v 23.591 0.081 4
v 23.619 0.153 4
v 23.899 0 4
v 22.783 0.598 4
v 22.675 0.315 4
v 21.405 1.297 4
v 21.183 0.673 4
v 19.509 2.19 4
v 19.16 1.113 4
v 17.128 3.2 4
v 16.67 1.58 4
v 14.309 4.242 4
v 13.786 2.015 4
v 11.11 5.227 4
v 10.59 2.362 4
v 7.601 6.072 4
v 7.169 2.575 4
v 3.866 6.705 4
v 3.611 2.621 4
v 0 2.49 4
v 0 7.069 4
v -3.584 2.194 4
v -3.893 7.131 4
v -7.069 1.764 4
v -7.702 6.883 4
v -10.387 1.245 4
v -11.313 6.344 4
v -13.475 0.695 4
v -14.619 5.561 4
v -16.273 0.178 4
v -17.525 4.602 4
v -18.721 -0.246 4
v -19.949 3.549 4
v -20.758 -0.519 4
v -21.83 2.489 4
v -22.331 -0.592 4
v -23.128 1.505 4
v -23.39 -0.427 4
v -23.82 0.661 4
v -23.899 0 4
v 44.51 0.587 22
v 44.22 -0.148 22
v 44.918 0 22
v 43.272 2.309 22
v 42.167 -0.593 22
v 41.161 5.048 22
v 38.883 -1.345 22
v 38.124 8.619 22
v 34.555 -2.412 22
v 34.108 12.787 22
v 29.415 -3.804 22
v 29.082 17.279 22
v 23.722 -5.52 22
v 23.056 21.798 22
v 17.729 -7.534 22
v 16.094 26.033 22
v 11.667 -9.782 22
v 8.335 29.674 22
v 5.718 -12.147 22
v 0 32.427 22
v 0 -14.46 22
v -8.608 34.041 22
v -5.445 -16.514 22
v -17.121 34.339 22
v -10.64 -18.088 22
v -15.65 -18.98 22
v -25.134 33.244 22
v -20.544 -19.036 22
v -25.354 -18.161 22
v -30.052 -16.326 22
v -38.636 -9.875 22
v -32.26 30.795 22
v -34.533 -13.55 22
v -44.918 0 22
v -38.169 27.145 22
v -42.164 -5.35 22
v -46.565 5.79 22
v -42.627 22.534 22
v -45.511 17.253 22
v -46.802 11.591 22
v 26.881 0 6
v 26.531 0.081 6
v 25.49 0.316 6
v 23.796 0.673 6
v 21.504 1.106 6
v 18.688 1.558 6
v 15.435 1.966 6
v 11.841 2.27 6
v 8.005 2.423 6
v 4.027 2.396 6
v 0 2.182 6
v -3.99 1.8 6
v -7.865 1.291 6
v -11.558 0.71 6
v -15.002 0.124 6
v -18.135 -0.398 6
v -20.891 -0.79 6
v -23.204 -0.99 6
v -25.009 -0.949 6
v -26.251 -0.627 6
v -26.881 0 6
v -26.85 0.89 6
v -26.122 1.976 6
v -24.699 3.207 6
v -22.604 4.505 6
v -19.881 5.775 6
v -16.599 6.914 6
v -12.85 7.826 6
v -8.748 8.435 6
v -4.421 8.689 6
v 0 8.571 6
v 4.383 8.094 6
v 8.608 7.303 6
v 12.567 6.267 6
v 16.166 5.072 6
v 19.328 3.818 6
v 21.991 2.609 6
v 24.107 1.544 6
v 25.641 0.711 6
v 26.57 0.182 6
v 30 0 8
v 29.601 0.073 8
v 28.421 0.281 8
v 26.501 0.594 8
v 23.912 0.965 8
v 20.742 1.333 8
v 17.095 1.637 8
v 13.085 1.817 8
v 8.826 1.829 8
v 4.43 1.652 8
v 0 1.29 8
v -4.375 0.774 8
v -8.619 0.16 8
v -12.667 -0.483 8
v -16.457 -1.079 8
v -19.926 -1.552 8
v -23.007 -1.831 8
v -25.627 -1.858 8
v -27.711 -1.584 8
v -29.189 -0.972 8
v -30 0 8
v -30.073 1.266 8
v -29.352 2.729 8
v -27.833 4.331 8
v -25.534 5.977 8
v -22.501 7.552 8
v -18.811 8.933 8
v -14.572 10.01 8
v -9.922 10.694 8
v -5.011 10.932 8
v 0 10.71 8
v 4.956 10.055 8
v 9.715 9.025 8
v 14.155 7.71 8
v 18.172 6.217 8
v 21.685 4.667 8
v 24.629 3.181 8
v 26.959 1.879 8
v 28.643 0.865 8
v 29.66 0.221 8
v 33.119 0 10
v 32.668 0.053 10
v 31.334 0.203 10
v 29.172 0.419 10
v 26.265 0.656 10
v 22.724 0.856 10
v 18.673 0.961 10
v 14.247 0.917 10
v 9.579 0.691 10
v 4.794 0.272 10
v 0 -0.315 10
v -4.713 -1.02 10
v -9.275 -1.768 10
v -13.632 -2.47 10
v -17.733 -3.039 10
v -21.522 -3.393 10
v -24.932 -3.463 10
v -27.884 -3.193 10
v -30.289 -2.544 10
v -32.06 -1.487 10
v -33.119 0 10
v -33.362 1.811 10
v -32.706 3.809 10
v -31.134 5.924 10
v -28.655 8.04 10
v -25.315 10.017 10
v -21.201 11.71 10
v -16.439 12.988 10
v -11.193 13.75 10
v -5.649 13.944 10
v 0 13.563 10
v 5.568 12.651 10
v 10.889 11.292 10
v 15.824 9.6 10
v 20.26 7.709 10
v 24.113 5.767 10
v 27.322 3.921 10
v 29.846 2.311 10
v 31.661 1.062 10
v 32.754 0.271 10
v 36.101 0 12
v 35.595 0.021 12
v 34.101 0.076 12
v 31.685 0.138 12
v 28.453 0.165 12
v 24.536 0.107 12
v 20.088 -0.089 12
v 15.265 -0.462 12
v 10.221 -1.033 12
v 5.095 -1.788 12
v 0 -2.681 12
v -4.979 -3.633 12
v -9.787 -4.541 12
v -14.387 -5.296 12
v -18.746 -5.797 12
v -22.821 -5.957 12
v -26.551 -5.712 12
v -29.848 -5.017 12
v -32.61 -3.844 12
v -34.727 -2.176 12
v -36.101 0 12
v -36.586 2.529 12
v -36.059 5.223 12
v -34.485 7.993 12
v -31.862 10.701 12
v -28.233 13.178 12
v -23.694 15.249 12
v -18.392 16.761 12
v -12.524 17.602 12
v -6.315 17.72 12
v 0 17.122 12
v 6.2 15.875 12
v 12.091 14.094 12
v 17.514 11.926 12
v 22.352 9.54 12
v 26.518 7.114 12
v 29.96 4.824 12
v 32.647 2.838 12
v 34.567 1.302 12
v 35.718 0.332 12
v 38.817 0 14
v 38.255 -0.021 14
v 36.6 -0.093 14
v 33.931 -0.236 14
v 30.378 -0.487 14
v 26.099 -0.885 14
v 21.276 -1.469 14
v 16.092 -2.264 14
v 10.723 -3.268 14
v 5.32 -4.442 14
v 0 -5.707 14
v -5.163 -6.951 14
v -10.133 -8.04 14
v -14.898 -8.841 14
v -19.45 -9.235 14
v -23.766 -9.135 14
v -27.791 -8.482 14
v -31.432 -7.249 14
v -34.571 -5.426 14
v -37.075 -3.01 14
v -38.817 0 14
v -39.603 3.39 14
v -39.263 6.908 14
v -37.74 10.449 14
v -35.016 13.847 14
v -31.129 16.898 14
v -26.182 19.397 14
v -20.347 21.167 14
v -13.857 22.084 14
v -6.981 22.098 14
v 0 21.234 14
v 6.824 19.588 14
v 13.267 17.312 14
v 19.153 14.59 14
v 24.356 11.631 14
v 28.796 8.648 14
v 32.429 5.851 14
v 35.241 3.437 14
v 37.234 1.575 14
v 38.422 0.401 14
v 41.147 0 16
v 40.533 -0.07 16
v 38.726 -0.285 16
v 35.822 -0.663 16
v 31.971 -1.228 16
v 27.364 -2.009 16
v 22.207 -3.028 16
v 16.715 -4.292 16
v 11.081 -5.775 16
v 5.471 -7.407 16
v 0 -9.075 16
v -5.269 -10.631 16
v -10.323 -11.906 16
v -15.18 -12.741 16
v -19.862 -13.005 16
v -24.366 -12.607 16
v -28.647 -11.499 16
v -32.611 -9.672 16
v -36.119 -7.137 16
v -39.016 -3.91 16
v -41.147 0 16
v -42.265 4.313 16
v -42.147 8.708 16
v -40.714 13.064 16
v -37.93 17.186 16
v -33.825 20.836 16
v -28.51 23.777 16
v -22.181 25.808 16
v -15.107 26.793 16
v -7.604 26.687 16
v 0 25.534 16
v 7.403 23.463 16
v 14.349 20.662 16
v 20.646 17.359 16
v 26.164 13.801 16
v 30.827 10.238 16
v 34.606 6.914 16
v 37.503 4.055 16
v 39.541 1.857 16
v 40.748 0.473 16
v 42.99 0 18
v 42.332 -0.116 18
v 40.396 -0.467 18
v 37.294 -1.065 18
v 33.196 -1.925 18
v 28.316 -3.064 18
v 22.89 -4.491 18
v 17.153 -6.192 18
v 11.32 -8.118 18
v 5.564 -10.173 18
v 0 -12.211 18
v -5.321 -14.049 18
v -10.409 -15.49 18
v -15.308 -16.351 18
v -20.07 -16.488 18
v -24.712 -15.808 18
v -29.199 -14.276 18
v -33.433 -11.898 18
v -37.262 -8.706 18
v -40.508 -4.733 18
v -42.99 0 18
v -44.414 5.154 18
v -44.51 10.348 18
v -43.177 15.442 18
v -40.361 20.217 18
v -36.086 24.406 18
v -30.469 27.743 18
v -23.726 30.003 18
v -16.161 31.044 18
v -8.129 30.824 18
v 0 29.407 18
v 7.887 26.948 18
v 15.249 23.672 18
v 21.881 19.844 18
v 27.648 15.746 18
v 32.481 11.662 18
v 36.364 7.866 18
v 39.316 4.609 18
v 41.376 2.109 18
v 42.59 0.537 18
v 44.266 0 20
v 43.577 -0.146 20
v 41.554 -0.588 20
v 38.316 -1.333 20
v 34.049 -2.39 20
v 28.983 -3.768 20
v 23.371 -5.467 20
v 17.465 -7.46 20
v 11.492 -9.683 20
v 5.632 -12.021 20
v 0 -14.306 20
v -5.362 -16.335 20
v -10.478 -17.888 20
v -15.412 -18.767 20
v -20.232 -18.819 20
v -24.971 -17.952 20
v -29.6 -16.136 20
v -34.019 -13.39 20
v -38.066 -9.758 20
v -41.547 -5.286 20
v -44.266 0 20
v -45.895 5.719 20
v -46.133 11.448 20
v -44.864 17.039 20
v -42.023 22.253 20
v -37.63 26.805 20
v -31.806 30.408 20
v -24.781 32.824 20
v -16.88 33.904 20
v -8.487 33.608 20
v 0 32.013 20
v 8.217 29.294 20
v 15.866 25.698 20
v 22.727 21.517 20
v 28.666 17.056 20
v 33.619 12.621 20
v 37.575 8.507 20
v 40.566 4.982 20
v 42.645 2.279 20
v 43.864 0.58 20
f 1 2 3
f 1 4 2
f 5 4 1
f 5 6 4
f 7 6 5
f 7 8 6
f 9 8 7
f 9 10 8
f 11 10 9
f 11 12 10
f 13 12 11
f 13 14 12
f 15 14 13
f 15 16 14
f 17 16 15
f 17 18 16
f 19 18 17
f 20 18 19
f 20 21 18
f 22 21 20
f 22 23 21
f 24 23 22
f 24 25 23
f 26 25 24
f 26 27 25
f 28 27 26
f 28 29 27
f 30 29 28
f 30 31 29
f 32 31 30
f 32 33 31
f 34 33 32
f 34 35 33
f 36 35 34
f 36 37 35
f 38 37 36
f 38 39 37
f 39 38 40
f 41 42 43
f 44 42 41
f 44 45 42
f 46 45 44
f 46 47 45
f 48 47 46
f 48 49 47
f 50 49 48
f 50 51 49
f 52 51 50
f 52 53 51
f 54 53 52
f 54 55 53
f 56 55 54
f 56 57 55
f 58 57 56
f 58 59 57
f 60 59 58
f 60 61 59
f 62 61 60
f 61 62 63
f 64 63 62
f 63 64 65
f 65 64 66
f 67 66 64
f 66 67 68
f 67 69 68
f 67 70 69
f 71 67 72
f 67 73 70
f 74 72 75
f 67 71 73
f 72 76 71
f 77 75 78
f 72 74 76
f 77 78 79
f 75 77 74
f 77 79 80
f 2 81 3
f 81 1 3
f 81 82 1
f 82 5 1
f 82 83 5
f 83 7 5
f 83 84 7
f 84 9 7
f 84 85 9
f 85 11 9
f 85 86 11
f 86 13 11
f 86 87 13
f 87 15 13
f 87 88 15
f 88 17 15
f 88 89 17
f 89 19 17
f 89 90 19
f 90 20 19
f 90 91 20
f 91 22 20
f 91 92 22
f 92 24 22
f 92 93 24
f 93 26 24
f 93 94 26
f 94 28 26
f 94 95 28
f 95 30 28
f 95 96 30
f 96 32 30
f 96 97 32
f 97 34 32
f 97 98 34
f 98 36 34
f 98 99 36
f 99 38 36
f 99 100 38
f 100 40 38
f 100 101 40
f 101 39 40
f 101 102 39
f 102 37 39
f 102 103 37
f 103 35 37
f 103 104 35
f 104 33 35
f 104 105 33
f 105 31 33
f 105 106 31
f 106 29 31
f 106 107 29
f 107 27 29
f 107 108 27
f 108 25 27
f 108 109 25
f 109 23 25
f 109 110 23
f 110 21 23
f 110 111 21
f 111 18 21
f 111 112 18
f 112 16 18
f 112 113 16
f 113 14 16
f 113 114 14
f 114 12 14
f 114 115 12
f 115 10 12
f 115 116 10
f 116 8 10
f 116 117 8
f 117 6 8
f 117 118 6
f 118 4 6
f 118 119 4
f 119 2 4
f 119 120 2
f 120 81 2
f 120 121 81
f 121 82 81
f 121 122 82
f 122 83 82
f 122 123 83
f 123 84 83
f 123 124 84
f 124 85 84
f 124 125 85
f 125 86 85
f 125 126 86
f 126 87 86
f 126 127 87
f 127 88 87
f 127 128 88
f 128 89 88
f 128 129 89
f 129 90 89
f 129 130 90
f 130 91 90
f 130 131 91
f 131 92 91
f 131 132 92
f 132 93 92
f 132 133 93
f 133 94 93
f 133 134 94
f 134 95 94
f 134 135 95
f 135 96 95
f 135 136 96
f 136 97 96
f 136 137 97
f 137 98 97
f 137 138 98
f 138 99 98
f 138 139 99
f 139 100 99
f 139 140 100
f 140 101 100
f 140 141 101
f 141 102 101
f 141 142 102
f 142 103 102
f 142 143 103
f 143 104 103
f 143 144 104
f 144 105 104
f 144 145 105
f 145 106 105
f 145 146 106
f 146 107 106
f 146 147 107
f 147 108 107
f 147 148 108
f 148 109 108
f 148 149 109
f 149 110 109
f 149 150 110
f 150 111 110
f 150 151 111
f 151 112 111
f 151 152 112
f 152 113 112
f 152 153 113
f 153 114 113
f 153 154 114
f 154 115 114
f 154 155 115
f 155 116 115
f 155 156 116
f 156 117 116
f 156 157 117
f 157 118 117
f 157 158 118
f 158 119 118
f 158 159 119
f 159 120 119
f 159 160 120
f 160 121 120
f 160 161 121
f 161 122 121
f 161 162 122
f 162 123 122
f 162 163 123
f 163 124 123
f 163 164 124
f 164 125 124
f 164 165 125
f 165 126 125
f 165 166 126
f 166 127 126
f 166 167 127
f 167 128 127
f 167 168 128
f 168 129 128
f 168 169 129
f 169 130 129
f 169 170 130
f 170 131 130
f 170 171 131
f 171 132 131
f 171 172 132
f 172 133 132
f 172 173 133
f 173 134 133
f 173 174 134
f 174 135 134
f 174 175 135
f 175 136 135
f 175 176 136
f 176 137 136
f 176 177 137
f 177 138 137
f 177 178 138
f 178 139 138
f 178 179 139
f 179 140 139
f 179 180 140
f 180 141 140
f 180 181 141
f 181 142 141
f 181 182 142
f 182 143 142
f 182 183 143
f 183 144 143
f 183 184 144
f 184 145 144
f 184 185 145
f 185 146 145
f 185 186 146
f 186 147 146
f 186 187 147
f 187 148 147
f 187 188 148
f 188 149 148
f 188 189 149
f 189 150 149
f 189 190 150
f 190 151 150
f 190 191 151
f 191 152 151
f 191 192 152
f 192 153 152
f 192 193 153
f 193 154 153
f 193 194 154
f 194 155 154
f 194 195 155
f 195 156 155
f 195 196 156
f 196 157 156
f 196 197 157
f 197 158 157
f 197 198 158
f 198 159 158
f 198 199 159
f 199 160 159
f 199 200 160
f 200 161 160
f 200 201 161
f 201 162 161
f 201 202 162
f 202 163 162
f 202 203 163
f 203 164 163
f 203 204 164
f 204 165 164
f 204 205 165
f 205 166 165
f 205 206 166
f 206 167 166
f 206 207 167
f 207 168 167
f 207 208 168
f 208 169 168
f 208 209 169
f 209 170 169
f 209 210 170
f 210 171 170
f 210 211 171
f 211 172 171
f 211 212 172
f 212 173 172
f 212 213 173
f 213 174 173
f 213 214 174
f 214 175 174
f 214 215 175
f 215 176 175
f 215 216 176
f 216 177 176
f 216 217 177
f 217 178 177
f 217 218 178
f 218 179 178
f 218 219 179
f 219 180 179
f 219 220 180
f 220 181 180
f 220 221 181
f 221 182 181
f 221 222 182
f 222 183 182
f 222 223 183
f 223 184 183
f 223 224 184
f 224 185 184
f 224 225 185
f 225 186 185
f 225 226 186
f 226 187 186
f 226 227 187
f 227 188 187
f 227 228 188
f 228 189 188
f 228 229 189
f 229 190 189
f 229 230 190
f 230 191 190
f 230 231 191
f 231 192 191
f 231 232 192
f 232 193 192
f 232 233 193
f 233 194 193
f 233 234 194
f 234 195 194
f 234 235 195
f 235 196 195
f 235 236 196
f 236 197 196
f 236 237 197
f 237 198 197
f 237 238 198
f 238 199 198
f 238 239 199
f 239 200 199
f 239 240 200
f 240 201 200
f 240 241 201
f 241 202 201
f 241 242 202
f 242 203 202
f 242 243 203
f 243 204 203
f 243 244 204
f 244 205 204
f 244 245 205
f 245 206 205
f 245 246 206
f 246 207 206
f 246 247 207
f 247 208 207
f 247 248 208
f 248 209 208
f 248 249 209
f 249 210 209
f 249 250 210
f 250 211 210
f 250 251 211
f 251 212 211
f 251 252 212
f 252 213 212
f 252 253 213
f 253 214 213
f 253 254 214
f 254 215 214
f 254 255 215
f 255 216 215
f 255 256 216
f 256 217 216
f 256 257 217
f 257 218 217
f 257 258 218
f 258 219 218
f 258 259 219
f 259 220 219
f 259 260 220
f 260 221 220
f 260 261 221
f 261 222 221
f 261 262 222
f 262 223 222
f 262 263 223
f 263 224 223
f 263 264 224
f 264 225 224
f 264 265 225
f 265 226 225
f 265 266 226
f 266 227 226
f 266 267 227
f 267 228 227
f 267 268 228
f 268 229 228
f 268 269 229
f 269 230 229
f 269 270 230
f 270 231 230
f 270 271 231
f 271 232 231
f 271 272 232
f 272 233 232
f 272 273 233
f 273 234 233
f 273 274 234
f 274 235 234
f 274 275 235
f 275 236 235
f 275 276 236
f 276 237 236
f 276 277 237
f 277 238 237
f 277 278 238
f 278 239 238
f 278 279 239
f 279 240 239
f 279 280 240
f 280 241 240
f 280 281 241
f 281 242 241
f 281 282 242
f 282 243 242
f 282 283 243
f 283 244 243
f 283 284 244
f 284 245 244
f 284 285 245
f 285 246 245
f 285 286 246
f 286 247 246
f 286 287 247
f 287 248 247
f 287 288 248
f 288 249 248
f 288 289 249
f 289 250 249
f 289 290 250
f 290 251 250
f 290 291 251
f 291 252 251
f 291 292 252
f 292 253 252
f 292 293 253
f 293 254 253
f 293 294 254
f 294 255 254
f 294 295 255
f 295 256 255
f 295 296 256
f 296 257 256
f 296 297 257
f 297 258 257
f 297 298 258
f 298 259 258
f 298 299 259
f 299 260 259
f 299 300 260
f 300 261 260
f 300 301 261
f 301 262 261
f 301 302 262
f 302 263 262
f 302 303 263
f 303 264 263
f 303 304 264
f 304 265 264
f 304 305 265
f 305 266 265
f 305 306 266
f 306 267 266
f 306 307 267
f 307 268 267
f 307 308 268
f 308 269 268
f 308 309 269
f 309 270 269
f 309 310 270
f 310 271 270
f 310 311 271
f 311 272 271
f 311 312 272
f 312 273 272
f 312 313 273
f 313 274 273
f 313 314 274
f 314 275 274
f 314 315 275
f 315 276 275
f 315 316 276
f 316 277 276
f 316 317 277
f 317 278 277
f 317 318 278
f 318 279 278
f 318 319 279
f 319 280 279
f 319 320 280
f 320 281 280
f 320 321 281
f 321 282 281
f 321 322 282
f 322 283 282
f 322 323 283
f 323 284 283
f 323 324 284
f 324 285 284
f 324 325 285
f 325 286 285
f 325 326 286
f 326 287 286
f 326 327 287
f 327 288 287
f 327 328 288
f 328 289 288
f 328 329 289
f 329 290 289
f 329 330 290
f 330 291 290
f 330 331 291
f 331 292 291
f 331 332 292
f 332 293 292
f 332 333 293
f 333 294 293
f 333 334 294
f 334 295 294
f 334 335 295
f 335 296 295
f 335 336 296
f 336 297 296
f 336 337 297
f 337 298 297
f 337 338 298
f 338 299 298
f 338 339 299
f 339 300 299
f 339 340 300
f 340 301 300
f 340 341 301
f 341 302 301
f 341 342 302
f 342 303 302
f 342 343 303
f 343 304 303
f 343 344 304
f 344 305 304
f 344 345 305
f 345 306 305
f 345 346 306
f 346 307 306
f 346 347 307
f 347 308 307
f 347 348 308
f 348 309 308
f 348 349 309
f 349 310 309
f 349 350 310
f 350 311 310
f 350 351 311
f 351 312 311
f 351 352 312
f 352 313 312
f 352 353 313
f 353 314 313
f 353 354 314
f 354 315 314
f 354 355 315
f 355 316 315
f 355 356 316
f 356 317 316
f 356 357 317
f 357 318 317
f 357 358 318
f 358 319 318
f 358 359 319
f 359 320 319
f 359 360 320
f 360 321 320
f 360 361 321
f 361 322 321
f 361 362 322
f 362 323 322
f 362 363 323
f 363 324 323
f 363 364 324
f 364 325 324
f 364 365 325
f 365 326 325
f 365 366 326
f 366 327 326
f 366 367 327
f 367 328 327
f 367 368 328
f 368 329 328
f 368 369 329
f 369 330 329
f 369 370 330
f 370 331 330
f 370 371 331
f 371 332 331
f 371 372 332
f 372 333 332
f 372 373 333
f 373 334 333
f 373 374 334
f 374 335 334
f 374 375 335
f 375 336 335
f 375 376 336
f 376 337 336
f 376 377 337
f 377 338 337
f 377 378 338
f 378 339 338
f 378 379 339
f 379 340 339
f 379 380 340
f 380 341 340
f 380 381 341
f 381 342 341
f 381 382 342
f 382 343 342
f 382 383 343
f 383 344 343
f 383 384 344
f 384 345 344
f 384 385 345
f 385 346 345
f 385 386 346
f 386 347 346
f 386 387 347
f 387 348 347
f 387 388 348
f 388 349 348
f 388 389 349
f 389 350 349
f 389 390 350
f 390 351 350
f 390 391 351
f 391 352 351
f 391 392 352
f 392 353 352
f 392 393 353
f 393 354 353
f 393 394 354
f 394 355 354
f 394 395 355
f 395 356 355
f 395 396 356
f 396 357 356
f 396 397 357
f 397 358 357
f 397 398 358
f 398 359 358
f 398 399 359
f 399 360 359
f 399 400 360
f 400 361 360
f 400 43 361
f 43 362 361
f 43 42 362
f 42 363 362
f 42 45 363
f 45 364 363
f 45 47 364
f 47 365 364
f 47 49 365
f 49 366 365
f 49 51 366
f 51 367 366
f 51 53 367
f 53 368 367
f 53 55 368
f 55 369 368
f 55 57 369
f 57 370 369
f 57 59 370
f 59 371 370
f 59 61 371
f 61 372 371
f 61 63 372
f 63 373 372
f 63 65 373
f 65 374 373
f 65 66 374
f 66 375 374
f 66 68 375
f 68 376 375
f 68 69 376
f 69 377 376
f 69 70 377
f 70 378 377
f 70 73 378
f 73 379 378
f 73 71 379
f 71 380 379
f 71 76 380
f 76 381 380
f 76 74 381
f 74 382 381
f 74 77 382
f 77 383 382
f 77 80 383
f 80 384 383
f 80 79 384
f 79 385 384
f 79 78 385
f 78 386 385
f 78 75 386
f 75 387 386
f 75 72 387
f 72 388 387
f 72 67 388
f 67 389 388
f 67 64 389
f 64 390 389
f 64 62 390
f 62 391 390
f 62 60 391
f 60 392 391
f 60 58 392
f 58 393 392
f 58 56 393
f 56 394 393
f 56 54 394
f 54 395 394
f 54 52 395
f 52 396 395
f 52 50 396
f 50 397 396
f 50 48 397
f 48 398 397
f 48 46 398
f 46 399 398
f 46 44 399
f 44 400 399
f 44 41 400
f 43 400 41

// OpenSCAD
// file: naca4.scad
// Naca4.scad - library for parametric airfoils of 4 digit NACA series
// Code: Rudolf Huttary, Berlin
// June 2015
// commercial use prohibited


// general use: for more examples refer to sampler.scad
// naca = naca digits or 3el vector  (default = 12 or [0, 0, .12])
// L    = chord length [mm]      (default= 100)
// N    = # sample points        (default= 81)
// h    = height [mm]            (default= 1)
// open = close at the thin end? (default = true)
// two equivalent example calls
 airfoil(naca = 2408, L = 60, N=1001, h = 30, open = false);
// airfoil(naca = [.2, .4, .32], L = 60, N=1001, h = 30, open = false);

module help()
{
  echo(str("\n\nList of signatures in lib:\n=================\n",
  "module airfoil(naca=2412, L = 100, N = 81, h = 1, open = false) - renders airfoil object\n",
  "module airfoil(naca=[.2, .4, .12], L = 100, N = 81, h = 1, open = false) - renders airfoil object using percentage for camber,  camber distance and thicknes\n",
  "function airfoil_data(naca=12, L = 100, N = 81, open = false)\n",
  "=================\n"));
}

help();
// this is the object
module airfoil(naca=12, L = 100, N = 81, h = 1, open = false)
{
  linear_extrude(height = h)
  polygon(points = airfoil_data(naca, L, N, open));
}

// this is the main function providing the airfoil data
function airfoil_data(naca=12, L = 100, N = 81, open = false) =
  let(Na = len(naca)!=3?NACA(naca):naca)
  let(A = [.2969, -0.126, -.3516, .2843, open?-0.1015:-0.1036])
  [for (b=[-180:360/(N):179.99])
    let (x = (1-cos(b))/2)
    let(yt = sign(b)*Na[2]/.2*(A*[sqrt(x), x, x*x, x*x*x, x*x*x*x]))
    Na[0]==0?L*[x, yt]:L*camber(x, yt, Na[0], Na[1], sign(b))];

// helper functions
function NACA(naca) =
  let (M = floor(naca/1000))
  let (P = floor((naca-M*1000)/100))
  [M/100, P/10, floor(naca-M*1000-P*100)/100];

function camber(x, y, M, P, upper) =
  let(yc = (x<P)?M/P/P*(2*P*x-x*x): M/(1-P)/(1-P)*(1 - 2*P + 2*P*x -x*x))
  let(dy = (x<P)?2*M/P/P*(P-x):2*M/(1-P)/(1-P)*(P-x))
  let(th = atan(dy))
  [upper ? x - y*sin(th):x + y*sin(th), upper ? yc + y*cos(th):yc - y*cos(th)];
// main file
// Naca4_sweep.scad - sweep library
// Code: Rudolf Huttary, Berlin
// June 2015
// commercial use prohibited

use <naca4.scad>

//example1();
//rotate([80, 180, 130])
example();

// sweep from NACA1480 to NACA6480 (len = 230 mm, winding y,z = 80°
// sweeps generates a single polyhedron from multiple datasets
module example()
{
  N = 40;
  sweep(gen_dat(N=5, dz=1,N=N));

  // specific generator function
  function gen_dat(M=10,dz=.1,N=10) = [for (i=[1:dz:M])
    let( L = length(i))
    let( af = vec3D(
        airfoil_data([.1,.5,thickness(i)], L=length(i), N = N)))
    T_(-L/2, 0, (i+1)*2, af)];  // translate airfoil

  function thickness(i) = .5*sin(i*i)+.1;
  function length(i) = (60+sin(12*(i-3))*30);
}

module help()
{
  echo(str("\n\nList of signatures in lib:\n=================\n",
  "sweep(dat, convexity = 5, showslices = false, plaincaps = true)  // dat - vec of vec2, with vec1 = airfoil_data\n",
  "function vec3D(v, z=0)  // expand vec2 to vec3",
  "function rot(w=0, p) // rotate vec2",
  "function T_(x=0, y=0, z=0, v) // translates vec of vec3\n",
  "function R_(x=0, y=0, z=0, v) // rotates vec of vec3\n",
  "function Rx_(x=0, v) // x-rotates vec of vec3\n",
  "function Ry_(y=0, v) // y-rotates vec of vec3\n",
  "function Rz_(z=0, v) // z-rotates vec of vec3\n",
  "function T_(x=0, y=0, z=0, v) // translates vec of vec3\n",
  "function Tx_(x=0, v) // x-translates vec of vec3\n",
  "function Ry_(y=0, v) // y-translates vec of vec3\n",
  "function Rz_(z=0, v) // z-translates vec of vec3\n",
  "function S_(x=0, y=0, z=0, v) // scales vec of vec3\n",
  "function Sx_(x=0, v) // x-translates vec of vec3\n",
  "function Sy_(x=0, v) // y-translates vec of vec3\n",
  "function Sz_(x=0, v) // z-translates vec of vec3\n",
  "=================\n"));
}


// generate polyhedron from multiple airfoil_datasets
// dat - vec of vec1, with vec1 = simple polygon like airfoil_data, > 3 points per dataset expected
module sweep(dat, convexity = 5, showslices = false, plaincaps = true)
{
  n = len(dat);     // # datasets
  l = len(dat[0]);  // points per dataset
  if(l<=3)
    echo("ERROR: sweep() expects more than 3 points per dataset");
  else
  {
    if(n==1)
      polyhedron(points = dat[0], faces = [count(l-1, 0)]);
    else{
    first = plaincaps?[count(l-1, 0)]:
            faces_polygon(l, true);  // triangulate first dataset
    last = plaincaps?[count((n-1)*l,(n)*l-1)]:
            faces_shift((n-2)*l, faces_polygon(l, false)); // triangulate last dataset
    if (showslices)
      for(i=[0:n-1])
        sweep([dat[i]]);
    else
      if (n<2)  // this case is also used recursively for showslices
        polyhedron(points = flat(), faces  = last, convexity = 5);
      else
      {
        polyhedron(points = flat(),
                   faces  = concat(first, last, faces_sweep(l,n)), convexity = 5);
      }
    }
  }
  function count(a, b) = let(st = (a<b?1:-1))[for (i=[a:st:b]) i];
  function faces_shift(d, dat) = [for (i=[0:len(dat)-1]) dat[i] + [d, d, d]];
  function flat() = [for (i=[0:n-1], j=[0:l-1]) dat[i][j]];
}

function del(A, n) = [for(i=[0:len(A)-1]) if (n!=i)A[i]];

//// composition stuff for polyhedron
  function faces_sweep(l, n=1) = let(M = n*l)
      concat([[0,l,l-1]],   // first face
      [for (i=[0:l*(n-1)-2], j = [0,1])
        j==0? [i, i+1, (i+l)] : [i+1, (i+l+1), i+l]],
      [[n*l-1, (n-1)*l-1, (n-1)*l]]) // last face
      ;

  function faces_polygon(l, first = true) = let(odd = (l%2==1), d=first?0:l)
    let(res = odd?concat([[d,d+1,d+l-1]],
      [for (i=[1:(l-3)/2], j=[0,1])(j==0)?[d+i,d+i+1,d+l-i]:[d+i+1,d+l-i-1, d+l-i]]):
      [for (i=[0:(l-4)/2], j=[0,1])(j==0)?[d+i,d+i+1,d+l-i-1]:[d+i+1,d+l-i-2, d+l-i-1]])
    first?facerev(res):res;

  function facerev(dat) = [for (i=[0:len(dat)-1]) [dat[i][0],dat[i][2],dat[i][1]]];



//// vector and vector set operation stuff ///////////////////////
//// Expand 2D vector into 3D
function vec3D(v, z=0) = [for(i = [0:len(v)-1])
  len(v[i])==2?[v[i][0], v[i][1], z]:v[i]+[0, 0, z]];

// Translation - 1D, 2D, 3D point vector //////////////////////////
// vector along all axes
function T_(x=0, y=0, z=0, v) = let(x_ = (len(x)==3)?x:[x, y, z])
  [for (i=[0:len(v)-1]) T__(x_[0], x_[1], x_[2], p=v[i])];
/// vector along one axis
function Tx_(x=0, v) = T_(x=x, v=v);
function Ty_(y=0, v) = T_(y=y, v=v);
function Tz_(z=0, v) = T_(z=z, v=v);
/// point along all axes 1D, 2D, 3D allowed
function T__(x=0, y=0, z=0, p) = len(p)==3?p+[x, y, z]:len(p)==2?p+[x, y]:p+x;

//// Rotation - 2D, 3D point vector ///////////////////////////////////
// vector around all axes
function R_(x=0, y=0, z=0, v) =             // 2D vectors allowed
  let(x_ = (len(x)==3)?x:[x, y, z])
  len(v[0])==3?Rx_(x_[0], Ry_(x_[1], Rz_(x_[2], v))):
  [for(i = [0:len(v)-1]) rot(x_[2], v[i])];
// vector around one axis
function Rx_(w, A) = A*[[1, 0, 0], [0, cos(w), sin(w)], [0, -sin(w), cos(w)]];
function Ry_(w, A) = A*[[cos(w), 0, sin(w)], [0, 1, 0], [-sin(w), 0, cos(w)]];
function Rz_(w, A) = A*[[cos(w), sin(w), 0], [-sin(w), cos(w), 0], [0, 0, 1]];


//// Scale - 2D, 3D point vector ///////////////////////////////////
// vector along all axes
function S_(x=1, y=1, z=1, v) =
  [for (i=[0:len(v)-1]) S__(x,y,z, v[i])];
// vector along one axis
function Sx_(x=0, v) = S_(x=x, v=v);
function Sy_(y=0, v) = S_(y=y, v=v);
function Sz_(z=0, v) = S_(z=z, v=v);
// single point in 2D
function S__(x=1, y=1, z=1, p) =
  len(p)==3?[p[0]*x, p[1]*y, p[2]*z]:len(p)==2?[p[0]*x+p[1]*y]:[p[0]*x];
